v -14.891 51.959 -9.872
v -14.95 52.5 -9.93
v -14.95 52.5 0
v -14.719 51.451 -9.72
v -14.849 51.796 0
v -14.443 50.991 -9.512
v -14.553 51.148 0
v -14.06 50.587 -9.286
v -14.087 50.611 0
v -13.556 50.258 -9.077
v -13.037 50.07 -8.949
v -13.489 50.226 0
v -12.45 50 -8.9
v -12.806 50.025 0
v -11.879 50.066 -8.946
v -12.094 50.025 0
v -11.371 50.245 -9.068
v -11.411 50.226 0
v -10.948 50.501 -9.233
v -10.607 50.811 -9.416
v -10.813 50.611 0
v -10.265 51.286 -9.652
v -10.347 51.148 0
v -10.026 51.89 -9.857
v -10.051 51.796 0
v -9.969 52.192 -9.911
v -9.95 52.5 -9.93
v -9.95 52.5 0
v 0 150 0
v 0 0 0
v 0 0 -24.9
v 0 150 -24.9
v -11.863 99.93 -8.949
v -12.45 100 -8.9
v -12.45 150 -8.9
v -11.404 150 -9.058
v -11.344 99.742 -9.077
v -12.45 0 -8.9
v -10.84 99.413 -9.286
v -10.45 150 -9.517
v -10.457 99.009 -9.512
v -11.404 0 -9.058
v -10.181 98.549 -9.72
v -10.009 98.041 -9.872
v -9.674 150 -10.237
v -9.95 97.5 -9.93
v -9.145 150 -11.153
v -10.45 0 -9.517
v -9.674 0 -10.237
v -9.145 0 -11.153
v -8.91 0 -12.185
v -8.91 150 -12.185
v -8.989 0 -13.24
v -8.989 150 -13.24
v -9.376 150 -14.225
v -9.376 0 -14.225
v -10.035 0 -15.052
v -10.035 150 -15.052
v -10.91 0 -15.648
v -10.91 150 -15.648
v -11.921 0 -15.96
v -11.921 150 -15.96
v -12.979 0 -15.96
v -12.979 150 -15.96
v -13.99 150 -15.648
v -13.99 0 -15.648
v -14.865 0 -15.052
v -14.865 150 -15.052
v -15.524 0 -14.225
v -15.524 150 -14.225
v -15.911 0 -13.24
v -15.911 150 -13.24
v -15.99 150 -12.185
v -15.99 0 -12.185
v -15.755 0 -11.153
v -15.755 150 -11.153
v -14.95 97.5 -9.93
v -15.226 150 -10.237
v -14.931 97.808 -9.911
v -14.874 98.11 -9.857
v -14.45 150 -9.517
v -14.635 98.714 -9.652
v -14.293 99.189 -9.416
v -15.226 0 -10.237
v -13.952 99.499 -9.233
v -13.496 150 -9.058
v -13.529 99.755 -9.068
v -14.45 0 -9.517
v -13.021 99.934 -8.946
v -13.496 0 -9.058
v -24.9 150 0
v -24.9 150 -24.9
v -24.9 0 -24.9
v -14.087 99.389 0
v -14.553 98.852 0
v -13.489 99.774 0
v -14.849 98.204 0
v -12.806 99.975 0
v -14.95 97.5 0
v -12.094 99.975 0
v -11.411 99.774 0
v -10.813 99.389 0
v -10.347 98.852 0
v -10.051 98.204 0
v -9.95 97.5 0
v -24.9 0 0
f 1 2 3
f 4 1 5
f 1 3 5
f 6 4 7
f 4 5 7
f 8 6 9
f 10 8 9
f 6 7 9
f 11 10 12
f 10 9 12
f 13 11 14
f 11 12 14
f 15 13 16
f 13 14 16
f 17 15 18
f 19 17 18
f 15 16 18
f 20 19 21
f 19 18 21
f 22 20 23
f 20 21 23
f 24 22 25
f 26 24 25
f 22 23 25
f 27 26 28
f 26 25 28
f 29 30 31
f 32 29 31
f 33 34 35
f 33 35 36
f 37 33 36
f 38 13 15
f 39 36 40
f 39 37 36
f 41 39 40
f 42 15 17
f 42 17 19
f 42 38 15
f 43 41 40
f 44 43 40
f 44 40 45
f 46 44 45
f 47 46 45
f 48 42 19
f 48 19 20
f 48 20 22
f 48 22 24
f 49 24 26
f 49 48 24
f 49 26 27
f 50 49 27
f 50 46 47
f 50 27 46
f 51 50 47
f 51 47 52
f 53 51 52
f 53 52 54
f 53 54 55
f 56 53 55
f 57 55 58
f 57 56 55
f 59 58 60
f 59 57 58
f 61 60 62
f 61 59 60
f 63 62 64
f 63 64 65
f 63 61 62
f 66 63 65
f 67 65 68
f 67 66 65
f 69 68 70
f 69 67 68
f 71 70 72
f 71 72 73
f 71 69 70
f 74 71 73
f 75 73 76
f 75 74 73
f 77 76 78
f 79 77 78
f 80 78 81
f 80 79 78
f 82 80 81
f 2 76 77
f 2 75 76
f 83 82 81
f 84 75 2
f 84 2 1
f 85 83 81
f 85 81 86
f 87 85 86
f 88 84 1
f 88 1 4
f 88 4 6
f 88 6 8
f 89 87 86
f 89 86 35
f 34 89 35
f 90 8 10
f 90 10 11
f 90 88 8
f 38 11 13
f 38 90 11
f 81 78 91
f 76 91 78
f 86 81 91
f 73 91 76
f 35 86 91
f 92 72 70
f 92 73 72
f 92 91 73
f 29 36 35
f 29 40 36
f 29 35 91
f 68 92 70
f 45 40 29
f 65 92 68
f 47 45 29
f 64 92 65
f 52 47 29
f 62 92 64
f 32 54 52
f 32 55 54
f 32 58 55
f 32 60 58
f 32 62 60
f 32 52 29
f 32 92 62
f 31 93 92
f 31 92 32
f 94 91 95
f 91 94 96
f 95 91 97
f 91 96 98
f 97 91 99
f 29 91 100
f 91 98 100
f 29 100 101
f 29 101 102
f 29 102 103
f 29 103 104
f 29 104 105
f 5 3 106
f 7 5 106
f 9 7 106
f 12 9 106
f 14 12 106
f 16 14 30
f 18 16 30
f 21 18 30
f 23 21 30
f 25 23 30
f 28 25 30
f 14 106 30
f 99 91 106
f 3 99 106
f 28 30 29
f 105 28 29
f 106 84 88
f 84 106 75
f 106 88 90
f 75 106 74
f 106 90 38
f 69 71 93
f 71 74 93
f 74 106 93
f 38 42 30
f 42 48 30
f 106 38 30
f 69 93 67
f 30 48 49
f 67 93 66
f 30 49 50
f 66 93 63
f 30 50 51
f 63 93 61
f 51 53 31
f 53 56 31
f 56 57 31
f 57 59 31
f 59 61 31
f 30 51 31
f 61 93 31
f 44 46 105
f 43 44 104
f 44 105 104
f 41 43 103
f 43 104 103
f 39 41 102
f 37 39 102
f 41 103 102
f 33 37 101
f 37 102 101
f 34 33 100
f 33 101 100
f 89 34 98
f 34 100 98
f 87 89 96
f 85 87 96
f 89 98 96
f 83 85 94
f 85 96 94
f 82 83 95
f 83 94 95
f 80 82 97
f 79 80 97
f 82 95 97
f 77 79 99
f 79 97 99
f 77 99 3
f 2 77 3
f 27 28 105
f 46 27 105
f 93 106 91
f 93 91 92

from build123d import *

# Parameters (mm, degrees)
SKETCH2_W               = 24.9
SKETCH2_H               = 24.9
SKETCH2_R               = 3.55
BOSS_EXTRUDE1_DEPTH     = 150
CUT_EXTRUDE1_REACH      = 156.078
CUT_EXTRUDE1_END_RADIUS = 3.55


with BuildPart() as part:
    # Sketch2 → Boss-Extrude1 (new body)
    with BuildSketch(Plane(origin=(0, 0, 0), x_dir=(1, 0, 0), z_dir=(0, 1, 0))):
        with Locations((-12.45, 12.45)):
            Rectangle(SKETCH2_W, SKETCH2_H)
        with Locations(Location((-12.45, 12.45, 0), (0, 0, 270))):
            Circle(SKETCH2_R, mode=Mode.SUBTRACT)
    extrude(amount=BOSS_EXTRUDE1_DEPTH)

    # Cut-Extrude1: up to this cylinder (the profile starts outside it)
    cut_extrude1_end = Plane(origin=(-12.45, 75, -12.45), z_dir=(0, -1, 0)) * Cylinder(CUT_EXTRUDE1_END_RADIUS, 320.256, mode=Mode.PRIVATE)
    # Sketch3 → Cut-Extrude1 (cut, up to the surface)
    with BuildSketch(Plane.XY, mode=Mode.PRIVATE) as cut_extrude1_sk1:
        with BuildLine():
            Line((-14.95, 97.5), (-14.95, 52.5))
            ThreePointArc((-14.95, 52.5), (-12.45, 50), (-9.95, 52.5))
            Line((-9.95, 52.5), (-9.95, 97.5))
            ThreePointArc((-9.95, 97.5), (-12.45, 100), (-14.95, 97.5))
        make_face()
    cut_extrude1_tool1 = extrude(cut_extrude1_sk1.sketch, amount=-CUT_EXTRUDE1_REACH, mode=Mode.PRIVATE) - cut_extrude1_end
    add(cut_extrude1_tool1.solids().sort_by_distance((-12.45, 75, 0))[0], mode=Mode.SUBTRACT)


solid = part.part
